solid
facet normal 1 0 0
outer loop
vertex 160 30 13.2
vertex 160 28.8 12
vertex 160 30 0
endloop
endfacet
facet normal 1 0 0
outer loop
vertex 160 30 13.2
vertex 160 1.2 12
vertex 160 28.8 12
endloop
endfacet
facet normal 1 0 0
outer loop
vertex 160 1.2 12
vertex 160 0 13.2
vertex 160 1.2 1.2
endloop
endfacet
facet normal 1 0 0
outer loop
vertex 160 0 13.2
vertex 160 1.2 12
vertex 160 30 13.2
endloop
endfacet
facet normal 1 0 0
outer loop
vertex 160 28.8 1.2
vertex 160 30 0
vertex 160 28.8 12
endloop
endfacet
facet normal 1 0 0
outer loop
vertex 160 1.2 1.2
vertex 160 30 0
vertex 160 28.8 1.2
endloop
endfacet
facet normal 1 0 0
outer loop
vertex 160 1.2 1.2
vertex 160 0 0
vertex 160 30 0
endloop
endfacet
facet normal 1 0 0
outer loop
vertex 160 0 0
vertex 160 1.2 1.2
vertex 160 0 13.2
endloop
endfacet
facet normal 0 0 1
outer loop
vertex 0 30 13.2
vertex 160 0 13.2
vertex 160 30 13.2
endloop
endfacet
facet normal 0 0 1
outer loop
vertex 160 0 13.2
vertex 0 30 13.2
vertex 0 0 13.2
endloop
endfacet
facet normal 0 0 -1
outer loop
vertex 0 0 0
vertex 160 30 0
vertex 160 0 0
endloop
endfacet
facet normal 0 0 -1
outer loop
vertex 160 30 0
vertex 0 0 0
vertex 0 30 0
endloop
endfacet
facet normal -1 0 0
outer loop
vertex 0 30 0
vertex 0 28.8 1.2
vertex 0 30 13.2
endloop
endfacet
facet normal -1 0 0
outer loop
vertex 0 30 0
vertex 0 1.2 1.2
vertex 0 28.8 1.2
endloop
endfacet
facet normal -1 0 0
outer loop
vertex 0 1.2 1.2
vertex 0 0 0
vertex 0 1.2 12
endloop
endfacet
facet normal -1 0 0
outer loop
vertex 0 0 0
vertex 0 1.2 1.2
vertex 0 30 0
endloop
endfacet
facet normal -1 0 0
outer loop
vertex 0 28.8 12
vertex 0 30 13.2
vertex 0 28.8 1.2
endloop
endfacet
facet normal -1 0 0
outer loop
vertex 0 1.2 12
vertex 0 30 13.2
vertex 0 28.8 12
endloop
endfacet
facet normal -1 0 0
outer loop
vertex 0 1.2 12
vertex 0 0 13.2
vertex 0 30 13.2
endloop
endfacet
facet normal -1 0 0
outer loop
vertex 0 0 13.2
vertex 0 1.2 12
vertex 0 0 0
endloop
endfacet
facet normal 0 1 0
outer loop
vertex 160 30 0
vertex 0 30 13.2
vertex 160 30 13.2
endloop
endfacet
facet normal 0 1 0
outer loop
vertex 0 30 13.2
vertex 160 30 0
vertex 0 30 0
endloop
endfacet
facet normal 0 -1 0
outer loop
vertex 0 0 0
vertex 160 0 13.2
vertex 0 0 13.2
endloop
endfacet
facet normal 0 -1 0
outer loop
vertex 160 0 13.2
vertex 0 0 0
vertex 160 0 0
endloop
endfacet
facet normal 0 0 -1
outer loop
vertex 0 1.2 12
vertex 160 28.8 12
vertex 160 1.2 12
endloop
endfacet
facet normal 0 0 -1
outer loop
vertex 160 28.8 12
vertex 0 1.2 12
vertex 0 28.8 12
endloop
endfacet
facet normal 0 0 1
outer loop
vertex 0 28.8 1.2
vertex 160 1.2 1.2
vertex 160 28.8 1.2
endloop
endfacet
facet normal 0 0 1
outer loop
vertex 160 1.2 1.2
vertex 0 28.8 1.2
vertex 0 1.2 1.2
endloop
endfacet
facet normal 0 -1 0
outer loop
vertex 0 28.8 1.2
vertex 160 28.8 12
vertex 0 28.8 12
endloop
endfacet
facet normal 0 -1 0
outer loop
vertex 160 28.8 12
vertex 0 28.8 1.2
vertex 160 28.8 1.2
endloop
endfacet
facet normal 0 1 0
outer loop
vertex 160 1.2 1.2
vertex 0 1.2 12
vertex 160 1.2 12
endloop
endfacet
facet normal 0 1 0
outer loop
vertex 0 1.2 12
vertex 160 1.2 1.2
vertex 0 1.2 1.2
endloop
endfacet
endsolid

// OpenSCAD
// ScienceClaw rectangular_tube; nominal millimeters. Printer process requires validation.
length = 160;
width = 30;
height = 13.2;
thickness = 1.2;
difference() { cube([length,width,height]); translate([-1, thickness, thickness]) cube([length+2, width-2*thickness, height-2*thickness]); }
